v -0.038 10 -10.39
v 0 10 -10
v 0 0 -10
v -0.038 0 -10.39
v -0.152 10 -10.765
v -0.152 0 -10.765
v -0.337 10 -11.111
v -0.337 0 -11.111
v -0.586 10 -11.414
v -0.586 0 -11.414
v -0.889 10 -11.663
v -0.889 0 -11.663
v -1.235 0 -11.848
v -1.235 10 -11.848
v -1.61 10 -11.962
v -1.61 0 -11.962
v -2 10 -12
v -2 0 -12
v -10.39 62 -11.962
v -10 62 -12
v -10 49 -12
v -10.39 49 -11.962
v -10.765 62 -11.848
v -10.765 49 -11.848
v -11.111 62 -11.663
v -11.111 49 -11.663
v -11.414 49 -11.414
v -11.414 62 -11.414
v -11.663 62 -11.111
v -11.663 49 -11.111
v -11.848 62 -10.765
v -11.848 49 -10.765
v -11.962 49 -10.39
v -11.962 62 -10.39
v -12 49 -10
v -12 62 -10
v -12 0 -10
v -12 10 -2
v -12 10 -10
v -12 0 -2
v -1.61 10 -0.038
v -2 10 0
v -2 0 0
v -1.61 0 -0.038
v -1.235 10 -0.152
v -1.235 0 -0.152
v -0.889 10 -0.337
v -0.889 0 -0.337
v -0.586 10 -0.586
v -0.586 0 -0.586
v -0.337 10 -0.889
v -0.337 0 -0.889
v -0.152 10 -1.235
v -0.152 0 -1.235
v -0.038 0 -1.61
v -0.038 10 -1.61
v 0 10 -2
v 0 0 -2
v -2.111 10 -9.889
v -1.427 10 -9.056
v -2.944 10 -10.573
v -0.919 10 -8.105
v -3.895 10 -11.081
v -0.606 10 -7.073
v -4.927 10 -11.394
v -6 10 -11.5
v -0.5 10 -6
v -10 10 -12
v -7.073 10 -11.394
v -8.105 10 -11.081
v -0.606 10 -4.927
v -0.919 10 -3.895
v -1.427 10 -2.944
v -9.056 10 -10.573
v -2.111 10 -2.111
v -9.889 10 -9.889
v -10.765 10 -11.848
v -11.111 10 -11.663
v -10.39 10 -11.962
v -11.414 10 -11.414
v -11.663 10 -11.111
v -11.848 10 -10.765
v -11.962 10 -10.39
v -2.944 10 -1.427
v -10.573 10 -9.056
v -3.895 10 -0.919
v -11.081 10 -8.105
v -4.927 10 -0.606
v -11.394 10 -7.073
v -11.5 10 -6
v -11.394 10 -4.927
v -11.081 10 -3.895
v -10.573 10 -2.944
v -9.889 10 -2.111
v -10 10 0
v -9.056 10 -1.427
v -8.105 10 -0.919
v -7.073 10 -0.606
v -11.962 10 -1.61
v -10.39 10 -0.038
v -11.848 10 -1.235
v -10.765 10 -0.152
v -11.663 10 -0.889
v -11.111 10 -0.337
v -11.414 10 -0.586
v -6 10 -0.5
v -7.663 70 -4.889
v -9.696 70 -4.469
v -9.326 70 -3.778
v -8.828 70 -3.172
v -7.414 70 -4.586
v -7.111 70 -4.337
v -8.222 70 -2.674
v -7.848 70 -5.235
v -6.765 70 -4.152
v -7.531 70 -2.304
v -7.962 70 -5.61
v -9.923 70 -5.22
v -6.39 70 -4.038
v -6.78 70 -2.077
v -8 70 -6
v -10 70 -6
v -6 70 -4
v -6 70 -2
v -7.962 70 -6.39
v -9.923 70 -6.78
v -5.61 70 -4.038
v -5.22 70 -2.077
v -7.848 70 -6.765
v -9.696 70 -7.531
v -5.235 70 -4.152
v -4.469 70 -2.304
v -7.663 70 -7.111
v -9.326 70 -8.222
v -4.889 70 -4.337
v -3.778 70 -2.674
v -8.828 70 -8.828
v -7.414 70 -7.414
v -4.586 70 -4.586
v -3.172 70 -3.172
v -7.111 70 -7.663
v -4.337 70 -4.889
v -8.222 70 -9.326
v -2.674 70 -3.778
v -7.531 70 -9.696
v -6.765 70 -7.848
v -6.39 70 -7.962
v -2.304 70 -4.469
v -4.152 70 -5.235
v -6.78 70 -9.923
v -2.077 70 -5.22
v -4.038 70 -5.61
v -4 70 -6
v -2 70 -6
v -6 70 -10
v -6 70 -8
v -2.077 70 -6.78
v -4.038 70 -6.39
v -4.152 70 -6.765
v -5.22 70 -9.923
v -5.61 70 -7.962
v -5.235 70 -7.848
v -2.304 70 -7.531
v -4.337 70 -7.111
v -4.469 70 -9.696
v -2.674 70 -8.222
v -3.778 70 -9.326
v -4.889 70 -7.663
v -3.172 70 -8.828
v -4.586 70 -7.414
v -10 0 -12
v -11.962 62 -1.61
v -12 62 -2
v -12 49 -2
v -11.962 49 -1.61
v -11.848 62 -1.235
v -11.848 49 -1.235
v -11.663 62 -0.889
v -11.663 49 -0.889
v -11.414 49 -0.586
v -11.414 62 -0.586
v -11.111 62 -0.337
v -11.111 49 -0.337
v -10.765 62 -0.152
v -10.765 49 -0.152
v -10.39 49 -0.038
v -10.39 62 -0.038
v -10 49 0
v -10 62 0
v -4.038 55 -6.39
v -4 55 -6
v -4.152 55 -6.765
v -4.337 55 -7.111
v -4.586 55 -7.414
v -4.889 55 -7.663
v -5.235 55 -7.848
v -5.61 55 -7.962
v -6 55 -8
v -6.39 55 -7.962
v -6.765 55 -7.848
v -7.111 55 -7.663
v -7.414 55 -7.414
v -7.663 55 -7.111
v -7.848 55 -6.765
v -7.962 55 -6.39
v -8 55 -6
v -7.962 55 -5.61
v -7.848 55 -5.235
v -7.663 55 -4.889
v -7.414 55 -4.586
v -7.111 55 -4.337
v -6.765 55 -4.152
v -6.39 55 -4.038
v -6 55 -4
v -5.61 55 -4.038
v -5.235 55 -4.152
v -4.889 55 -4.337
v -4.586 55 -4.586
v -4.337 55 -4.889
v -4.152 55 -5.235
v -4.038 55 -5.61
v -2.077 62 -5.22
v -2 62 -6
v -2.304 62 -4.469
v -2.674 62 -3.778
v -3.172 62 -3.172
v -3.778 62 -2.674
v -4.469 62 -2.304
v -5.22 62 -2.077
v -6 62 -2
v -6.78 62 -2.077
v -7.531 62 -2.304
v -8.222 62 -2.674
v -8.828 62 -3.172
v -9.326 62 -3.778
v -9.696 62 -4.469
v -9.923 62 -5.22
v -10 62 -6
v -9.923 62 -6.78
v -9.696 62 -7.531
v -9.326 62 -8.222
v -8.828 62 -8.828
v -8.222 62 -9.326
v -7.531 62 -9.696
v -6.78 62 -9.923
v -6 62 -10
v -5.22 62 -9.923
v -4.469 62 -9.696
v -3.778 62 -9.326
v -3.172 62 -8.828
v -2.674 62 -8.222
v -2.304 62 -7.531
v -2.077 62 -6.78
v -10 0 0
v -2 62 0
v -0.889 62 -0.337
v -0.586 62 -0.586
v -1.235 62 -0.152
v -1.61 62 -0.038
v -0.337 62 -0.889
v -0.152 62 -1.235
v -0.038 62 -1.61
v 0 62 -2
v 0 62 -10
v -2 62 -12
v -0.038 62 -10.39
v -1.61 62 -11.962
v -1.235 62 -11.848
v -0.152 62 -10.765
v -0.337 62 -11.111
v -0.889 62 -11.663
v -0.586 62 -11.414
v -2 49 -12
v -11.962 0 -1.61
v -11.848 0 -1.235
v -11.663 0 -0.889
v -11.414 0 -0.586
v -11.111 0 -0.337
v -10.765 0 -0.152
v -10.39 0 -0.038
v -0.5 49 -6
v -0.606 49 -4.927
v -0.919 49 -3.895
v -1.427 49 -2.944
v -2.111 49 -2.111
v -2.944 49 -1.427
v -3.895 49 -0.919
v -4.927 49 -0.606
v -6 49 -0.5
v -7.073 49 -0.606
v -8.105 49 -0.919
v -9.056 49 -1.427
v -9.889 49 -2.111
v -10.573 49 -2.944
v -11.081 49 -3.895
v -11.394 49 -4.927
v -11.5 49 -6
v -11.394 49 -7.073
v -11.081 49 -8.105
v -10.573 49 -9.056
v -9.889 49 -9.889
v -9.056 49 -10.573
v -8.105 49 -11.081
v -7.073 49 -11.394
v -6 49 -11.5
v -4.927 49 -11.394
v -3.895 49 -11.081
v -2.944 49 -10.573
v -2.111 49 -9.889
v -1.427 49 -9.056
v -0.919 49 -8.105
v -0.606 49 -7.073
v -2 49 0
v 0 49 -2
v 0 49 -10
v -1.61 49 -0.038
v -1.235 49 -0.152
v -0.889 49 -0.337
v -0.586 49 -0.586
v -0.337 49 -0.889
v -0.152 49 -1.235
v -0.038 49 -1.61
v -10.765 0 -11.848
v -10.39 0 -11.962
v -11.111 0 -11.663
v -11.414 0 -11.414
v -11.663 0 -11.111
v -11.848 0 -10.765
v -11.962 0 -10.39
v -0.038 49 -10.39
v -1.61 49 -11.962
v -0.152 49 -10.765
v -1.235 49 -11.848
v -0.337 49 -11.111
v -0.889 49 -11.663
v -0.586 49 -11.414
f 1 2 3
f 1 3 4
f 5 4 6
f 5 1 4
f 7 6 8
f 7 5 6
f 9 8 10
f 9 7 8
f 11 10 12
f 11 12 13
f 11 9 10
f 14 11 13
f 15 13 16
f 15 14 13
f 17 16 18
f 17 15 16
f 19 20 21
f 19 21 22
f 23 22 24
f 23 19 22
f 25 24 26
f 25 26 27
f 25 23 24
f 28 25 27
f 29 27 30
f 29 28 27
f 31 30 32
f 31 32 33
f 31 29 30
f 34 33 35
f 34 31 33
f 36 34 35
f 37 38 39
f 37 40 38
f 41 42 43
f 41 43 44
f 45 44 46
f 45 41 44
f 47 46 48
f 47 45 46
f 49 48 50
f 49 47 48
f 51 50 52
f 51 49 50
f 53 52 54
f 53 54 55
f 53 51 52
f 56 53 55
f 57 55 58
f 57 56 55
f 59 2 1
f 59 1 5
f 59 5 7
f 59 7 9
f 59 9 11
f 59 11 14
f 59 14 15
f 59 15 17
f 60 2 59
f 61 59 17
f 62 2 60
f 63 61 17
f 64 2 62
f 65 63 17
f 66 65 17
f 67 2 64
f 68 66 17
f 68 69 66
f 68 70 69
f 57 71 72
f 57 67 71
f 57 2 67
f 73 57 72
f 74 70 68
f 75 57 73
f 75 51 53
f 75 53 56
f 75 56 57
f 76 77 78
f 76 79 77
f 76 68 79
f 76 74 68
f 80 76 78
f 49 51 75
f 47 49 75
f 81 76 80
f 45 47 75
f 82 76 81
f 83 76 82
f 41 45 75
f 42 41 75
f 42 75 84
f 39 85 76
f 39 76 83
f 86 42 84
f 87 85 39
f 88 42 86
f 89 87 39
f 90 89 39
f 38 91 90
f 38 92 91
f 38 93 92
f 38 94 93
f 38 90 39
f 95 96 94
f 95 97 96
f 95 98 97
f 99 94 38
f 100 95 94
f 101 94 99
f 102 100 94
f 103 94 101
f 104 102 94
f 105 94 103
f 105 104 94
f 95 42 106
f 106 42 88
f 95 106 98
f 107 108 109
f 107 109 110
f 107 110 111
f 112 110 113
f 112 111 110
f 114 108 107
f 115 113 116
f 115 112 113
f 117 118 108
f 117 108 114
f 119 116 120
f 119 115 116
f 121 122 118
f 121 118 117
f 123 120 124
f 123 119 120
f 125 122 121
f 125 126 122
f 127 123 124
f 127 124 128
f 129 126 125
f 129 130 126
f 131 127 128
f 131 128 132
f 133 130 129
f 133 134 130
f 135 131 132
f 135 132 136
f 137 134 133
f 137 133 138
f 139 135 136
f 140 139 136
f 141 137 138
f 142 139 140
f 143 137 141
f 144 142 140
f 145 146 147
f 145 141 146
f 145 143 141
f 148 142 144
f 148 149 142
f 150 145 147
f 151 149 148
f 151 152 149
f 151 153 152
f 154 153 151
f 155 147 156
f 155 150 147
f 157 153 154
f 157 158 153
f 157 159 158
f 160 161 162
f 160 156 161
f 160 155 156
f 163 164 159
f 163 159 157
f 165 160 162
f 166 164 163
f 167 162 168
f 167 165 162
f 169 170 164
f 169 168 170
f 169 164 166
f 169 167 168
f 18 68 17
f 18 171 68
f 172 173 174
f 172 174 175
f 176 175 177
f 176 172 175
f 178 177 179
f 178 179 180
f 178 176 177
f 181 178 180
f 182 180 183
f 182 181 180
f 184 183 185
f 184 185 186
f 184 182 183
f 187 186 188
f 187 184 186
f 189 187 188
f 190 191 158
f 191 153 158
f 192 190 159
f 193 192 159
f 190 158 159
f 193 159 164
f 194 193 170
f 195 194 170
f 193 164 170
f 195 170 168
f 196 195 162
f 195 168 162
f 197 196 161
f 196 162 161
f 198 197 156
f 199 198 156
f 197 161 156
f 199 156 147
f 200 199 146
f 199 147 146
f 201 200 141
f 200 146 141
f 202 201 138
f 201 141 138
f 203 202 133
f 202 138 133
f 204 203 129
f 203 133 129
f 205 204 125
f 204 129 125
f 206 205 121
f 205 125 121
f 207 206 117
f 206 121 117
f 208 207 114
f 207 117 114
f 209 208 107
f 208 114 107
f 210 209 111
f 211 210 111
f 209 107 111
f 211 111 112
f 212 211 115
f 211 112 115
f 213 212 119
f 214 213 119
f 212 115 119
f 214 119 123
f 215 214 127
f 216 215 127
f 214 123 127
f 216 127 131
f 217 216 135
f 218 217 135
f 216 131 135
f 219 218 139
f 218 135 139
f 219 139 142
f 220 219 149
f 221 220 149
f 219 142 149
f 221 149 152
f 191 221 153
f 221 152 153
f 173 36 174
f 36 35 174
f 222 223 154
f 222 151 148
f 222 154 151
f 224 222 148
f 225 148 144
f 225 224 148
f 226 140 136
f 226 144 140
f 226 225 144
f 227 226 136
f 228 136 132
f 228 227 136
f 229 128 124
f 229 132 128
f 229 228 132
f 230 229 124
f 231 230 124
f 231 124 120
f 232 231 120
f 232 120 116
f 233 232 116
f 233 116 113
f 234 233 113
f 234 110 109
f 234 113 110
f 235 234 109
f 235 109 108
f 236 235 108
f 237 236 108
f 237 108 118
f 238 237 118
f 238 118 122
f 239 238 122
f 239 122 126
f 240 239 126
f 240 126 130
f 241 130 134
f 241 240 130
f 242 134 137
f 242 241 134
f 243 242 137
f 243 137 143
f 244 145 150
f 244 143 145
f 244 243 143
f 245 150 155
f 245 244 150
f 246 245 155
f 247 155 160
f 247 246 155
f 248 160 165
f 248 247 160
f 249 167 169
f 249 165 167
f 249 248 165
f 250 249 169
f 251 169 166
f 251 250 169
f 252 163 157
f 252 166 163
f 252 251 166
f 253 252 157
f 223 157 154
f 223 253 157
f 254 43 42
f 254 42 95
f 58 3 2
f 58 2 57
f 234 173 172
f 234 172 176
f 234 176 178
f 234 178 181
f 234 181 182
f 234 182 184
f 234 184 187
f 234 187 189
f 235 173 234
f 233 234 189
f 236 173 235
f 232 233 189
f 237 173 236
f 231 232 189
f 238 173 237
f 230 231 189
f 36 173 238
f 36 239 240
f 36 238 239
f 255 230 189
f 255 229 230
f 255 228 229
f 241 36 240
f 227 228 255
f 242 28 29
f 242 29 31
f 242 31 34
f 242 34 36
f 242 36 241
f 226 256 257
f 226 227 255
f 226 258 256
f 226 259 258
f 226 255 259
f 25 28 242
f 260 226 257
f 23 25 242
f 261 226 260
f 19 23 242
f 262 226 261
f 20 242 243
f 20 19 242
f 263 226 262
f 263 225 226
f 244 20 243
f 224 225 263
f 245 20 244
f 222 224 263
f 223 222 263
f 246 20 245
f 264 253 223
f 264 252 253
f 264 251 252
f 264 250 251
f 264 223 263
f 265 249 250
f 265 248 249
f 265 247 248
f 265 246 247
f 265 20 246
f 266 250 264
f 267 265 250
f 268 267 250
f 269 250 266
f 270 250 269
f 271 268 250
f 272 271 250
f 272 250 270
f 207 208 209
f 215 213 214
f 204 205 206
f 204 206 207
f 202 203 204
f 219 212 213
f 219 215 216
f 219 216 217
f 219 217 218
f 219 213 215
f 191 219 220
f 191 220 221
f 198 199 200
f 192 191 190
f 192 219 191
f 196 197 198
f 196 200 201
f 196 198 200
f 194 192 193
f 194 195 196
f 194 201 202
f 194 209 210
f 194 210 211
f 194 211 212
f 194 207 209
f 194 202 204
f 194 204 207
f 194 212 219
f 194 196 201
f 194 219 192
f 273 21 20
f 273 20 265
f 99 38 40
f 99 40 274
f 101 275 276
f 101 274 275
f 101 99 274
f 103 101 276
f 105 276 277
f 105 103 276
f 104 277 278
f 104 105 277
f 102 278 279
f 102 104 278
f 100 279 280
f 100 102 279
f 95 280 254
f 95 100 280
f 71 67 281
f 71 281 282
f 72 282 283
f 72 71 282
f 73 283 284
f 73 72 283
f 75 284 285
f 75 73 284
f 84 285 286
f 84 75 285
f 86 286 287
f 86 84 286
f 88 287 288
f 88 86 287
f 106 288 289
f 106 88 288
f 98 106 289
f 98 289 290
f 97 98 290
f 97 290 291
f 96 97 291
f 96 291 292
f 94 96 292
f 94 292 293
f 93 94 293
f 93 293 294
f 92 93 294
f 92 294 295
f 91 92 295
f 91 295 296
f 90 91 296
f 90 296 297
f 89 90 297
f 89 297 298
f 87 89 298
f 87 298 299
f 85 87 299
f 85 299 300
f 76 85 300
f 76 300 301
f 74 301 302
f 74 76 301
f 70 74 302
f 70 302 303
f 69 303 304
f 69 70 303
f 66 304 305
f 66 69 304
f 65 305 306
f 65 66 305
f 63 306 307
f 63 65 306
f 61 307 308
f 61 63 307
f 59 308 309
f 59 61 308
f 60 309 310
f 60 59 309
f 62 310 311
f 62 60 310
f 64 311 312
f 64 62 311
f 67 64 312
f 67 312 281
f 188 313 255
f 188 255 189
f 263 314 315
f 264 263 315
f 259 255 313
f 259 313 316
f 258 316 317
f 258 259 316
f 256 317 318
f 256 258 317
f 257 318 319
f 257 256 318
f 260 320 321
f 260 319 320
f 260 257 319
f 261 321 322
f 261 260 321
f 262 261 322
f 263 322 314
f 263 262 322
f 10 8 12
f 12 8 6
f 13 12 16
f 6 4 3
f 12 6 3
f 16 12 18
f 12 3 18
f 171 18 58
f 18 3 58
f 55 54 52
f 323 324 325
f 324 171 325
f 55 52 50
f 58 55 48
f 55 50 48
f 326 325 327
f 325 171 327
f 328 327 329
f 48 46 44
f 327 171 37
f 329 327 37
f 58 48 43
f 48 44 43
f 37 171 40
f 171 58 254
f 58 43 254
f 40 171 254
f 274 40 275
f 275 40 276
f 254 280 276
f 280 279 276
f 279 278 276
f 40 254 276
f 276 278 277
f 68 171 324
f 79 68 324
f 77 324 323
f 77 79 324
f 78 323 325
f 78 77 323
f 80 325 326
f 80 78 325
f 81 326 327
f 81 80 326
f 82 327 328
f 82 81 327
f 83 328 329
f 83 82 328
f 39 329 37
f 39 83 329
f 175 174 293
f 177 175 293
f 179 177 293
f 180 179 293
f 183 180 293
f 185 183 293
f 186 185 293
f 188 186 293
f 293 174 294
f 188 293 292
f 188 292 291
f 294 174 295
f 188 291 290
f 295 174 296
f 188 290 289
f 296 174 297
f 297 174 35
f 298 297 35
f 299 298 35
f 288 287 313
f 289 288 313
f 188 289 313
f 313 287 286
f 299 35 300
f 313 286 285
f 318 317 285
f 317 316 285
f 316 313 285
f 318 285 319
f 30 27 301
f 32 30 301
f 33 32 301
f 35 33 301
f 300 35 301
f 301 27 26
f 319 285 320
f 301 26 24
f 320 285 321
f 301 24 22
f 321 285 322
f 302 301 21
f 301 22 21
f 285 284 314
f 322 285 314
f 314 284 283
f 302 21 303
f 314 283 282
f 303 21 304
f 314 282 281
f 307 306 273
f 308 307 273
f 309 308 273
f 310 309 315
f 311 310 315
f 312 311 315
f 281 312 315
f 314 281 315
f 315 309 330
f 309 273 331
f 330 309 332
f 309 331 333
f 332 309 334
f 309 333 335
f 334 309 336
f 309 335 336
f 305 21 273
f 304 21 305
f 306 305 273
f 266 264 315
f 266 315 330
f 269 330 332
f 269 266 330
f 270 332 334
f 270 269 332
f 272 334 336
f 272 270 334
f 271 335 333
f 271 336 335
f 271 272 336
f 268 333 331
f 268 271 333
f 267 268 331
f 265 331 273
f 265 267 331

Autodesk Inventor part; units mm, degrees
ref_plane "YZ Plane" through (0, 0, 0) normal (1, 0, 0) x (0, 1, 0)
ref_plane "XZ Plane" through (0, 0, 0) normal (0, 1, 0) x (-1, 0, 0)
ref_plane "XY Plane" through (0, 0, 0) normal (0, 0, 1) x (1, 0, 0)
sketch "スケッチ1" plane through (0, 0, 0) normal (0, 1, 0) x (-1, 0, 0)
  line L0 (0, 0) -> (12, 0)
  line L1 (12, 0) -> (12, -12)
  line L2 (12, -12) -> (0, -12)
  line L3 (0, -12) -> (0, 0)
  dimension "d0" = 12
  dimension "d1" = 12
extrude "押し出し1" add sketch "スケッチ1" along normal blind 10
sketch "スケッチ2" plane through (0, 10, 0) normal (0, 1, 0) x (1, 0, 0)
  line L0 (-12, 0) -> (0, 0) projected
  line L1 (-6, 0) -> (-6, 12)
  line L2 (0, 12) -> (-12, 12) projected
  line L3 (-12, 12) -> (-12, 0) projected
  line L4 (-12, 6) -> (0, 6)
  circle A0 centre (-6, 6) radius 5.5
  dimension "d4" = 11
extrude "押し出し2" add sketch "スケッチ2" along normal blind 39 contours A0 L4 L1 | L1 L4 A0 | A0 L1 L4 | L1 A0 L4
sketch "スケッチ3" plane through (-6, 49, -6) normal (0, 1, 0) x (1, 0, 0)
  line L0 (-6, 6) -> (-6, -6) projected
  line L1 (6, -6) -> (6, 6) projected
  line L2 (-6, 6) -> (6, 6)
  line L3 (6, 6) -> (6, -6)
  line L4 (6, -6) -> (-6, -6)
  line L5 (-6, -6) -> (-6, 6)
extrude "押し出し3" add sketch "スケッチ3" along normal blind 13
fillet "フィレット1" radius 2 8 edges at (0, 55.5, 0) (0, 5, 0) (0, 5, -12) (0, 55.5, -12) (-12, 55.5, 0) (-12, 5, 0) (-12, 5, -12) (-12, 55.5, -12)
sketch "スケッチ4" plane through (-6, 62, -6) normal (0, 1, 0) x (1, 0, 0)
  circle A0 centre (0, 0) radius 4
  point P0 (6, -6)
  dimension "d10" = 8
extrude "押し出し4" add sketch "スケッチ4" along normal blind 8
sketch "スケッチ5" plane through (-6, 70, -6) normal (0, 1, 0) x (1, 0, 0)
  circle A0 centre (0, 0) radius 2
  point P0 (6, -6)
  dimension "d13" = 4
extrude "押し出し5" cut sketch "スケッチ5" against normal blind 15
properties part number "summer_cilinder"
